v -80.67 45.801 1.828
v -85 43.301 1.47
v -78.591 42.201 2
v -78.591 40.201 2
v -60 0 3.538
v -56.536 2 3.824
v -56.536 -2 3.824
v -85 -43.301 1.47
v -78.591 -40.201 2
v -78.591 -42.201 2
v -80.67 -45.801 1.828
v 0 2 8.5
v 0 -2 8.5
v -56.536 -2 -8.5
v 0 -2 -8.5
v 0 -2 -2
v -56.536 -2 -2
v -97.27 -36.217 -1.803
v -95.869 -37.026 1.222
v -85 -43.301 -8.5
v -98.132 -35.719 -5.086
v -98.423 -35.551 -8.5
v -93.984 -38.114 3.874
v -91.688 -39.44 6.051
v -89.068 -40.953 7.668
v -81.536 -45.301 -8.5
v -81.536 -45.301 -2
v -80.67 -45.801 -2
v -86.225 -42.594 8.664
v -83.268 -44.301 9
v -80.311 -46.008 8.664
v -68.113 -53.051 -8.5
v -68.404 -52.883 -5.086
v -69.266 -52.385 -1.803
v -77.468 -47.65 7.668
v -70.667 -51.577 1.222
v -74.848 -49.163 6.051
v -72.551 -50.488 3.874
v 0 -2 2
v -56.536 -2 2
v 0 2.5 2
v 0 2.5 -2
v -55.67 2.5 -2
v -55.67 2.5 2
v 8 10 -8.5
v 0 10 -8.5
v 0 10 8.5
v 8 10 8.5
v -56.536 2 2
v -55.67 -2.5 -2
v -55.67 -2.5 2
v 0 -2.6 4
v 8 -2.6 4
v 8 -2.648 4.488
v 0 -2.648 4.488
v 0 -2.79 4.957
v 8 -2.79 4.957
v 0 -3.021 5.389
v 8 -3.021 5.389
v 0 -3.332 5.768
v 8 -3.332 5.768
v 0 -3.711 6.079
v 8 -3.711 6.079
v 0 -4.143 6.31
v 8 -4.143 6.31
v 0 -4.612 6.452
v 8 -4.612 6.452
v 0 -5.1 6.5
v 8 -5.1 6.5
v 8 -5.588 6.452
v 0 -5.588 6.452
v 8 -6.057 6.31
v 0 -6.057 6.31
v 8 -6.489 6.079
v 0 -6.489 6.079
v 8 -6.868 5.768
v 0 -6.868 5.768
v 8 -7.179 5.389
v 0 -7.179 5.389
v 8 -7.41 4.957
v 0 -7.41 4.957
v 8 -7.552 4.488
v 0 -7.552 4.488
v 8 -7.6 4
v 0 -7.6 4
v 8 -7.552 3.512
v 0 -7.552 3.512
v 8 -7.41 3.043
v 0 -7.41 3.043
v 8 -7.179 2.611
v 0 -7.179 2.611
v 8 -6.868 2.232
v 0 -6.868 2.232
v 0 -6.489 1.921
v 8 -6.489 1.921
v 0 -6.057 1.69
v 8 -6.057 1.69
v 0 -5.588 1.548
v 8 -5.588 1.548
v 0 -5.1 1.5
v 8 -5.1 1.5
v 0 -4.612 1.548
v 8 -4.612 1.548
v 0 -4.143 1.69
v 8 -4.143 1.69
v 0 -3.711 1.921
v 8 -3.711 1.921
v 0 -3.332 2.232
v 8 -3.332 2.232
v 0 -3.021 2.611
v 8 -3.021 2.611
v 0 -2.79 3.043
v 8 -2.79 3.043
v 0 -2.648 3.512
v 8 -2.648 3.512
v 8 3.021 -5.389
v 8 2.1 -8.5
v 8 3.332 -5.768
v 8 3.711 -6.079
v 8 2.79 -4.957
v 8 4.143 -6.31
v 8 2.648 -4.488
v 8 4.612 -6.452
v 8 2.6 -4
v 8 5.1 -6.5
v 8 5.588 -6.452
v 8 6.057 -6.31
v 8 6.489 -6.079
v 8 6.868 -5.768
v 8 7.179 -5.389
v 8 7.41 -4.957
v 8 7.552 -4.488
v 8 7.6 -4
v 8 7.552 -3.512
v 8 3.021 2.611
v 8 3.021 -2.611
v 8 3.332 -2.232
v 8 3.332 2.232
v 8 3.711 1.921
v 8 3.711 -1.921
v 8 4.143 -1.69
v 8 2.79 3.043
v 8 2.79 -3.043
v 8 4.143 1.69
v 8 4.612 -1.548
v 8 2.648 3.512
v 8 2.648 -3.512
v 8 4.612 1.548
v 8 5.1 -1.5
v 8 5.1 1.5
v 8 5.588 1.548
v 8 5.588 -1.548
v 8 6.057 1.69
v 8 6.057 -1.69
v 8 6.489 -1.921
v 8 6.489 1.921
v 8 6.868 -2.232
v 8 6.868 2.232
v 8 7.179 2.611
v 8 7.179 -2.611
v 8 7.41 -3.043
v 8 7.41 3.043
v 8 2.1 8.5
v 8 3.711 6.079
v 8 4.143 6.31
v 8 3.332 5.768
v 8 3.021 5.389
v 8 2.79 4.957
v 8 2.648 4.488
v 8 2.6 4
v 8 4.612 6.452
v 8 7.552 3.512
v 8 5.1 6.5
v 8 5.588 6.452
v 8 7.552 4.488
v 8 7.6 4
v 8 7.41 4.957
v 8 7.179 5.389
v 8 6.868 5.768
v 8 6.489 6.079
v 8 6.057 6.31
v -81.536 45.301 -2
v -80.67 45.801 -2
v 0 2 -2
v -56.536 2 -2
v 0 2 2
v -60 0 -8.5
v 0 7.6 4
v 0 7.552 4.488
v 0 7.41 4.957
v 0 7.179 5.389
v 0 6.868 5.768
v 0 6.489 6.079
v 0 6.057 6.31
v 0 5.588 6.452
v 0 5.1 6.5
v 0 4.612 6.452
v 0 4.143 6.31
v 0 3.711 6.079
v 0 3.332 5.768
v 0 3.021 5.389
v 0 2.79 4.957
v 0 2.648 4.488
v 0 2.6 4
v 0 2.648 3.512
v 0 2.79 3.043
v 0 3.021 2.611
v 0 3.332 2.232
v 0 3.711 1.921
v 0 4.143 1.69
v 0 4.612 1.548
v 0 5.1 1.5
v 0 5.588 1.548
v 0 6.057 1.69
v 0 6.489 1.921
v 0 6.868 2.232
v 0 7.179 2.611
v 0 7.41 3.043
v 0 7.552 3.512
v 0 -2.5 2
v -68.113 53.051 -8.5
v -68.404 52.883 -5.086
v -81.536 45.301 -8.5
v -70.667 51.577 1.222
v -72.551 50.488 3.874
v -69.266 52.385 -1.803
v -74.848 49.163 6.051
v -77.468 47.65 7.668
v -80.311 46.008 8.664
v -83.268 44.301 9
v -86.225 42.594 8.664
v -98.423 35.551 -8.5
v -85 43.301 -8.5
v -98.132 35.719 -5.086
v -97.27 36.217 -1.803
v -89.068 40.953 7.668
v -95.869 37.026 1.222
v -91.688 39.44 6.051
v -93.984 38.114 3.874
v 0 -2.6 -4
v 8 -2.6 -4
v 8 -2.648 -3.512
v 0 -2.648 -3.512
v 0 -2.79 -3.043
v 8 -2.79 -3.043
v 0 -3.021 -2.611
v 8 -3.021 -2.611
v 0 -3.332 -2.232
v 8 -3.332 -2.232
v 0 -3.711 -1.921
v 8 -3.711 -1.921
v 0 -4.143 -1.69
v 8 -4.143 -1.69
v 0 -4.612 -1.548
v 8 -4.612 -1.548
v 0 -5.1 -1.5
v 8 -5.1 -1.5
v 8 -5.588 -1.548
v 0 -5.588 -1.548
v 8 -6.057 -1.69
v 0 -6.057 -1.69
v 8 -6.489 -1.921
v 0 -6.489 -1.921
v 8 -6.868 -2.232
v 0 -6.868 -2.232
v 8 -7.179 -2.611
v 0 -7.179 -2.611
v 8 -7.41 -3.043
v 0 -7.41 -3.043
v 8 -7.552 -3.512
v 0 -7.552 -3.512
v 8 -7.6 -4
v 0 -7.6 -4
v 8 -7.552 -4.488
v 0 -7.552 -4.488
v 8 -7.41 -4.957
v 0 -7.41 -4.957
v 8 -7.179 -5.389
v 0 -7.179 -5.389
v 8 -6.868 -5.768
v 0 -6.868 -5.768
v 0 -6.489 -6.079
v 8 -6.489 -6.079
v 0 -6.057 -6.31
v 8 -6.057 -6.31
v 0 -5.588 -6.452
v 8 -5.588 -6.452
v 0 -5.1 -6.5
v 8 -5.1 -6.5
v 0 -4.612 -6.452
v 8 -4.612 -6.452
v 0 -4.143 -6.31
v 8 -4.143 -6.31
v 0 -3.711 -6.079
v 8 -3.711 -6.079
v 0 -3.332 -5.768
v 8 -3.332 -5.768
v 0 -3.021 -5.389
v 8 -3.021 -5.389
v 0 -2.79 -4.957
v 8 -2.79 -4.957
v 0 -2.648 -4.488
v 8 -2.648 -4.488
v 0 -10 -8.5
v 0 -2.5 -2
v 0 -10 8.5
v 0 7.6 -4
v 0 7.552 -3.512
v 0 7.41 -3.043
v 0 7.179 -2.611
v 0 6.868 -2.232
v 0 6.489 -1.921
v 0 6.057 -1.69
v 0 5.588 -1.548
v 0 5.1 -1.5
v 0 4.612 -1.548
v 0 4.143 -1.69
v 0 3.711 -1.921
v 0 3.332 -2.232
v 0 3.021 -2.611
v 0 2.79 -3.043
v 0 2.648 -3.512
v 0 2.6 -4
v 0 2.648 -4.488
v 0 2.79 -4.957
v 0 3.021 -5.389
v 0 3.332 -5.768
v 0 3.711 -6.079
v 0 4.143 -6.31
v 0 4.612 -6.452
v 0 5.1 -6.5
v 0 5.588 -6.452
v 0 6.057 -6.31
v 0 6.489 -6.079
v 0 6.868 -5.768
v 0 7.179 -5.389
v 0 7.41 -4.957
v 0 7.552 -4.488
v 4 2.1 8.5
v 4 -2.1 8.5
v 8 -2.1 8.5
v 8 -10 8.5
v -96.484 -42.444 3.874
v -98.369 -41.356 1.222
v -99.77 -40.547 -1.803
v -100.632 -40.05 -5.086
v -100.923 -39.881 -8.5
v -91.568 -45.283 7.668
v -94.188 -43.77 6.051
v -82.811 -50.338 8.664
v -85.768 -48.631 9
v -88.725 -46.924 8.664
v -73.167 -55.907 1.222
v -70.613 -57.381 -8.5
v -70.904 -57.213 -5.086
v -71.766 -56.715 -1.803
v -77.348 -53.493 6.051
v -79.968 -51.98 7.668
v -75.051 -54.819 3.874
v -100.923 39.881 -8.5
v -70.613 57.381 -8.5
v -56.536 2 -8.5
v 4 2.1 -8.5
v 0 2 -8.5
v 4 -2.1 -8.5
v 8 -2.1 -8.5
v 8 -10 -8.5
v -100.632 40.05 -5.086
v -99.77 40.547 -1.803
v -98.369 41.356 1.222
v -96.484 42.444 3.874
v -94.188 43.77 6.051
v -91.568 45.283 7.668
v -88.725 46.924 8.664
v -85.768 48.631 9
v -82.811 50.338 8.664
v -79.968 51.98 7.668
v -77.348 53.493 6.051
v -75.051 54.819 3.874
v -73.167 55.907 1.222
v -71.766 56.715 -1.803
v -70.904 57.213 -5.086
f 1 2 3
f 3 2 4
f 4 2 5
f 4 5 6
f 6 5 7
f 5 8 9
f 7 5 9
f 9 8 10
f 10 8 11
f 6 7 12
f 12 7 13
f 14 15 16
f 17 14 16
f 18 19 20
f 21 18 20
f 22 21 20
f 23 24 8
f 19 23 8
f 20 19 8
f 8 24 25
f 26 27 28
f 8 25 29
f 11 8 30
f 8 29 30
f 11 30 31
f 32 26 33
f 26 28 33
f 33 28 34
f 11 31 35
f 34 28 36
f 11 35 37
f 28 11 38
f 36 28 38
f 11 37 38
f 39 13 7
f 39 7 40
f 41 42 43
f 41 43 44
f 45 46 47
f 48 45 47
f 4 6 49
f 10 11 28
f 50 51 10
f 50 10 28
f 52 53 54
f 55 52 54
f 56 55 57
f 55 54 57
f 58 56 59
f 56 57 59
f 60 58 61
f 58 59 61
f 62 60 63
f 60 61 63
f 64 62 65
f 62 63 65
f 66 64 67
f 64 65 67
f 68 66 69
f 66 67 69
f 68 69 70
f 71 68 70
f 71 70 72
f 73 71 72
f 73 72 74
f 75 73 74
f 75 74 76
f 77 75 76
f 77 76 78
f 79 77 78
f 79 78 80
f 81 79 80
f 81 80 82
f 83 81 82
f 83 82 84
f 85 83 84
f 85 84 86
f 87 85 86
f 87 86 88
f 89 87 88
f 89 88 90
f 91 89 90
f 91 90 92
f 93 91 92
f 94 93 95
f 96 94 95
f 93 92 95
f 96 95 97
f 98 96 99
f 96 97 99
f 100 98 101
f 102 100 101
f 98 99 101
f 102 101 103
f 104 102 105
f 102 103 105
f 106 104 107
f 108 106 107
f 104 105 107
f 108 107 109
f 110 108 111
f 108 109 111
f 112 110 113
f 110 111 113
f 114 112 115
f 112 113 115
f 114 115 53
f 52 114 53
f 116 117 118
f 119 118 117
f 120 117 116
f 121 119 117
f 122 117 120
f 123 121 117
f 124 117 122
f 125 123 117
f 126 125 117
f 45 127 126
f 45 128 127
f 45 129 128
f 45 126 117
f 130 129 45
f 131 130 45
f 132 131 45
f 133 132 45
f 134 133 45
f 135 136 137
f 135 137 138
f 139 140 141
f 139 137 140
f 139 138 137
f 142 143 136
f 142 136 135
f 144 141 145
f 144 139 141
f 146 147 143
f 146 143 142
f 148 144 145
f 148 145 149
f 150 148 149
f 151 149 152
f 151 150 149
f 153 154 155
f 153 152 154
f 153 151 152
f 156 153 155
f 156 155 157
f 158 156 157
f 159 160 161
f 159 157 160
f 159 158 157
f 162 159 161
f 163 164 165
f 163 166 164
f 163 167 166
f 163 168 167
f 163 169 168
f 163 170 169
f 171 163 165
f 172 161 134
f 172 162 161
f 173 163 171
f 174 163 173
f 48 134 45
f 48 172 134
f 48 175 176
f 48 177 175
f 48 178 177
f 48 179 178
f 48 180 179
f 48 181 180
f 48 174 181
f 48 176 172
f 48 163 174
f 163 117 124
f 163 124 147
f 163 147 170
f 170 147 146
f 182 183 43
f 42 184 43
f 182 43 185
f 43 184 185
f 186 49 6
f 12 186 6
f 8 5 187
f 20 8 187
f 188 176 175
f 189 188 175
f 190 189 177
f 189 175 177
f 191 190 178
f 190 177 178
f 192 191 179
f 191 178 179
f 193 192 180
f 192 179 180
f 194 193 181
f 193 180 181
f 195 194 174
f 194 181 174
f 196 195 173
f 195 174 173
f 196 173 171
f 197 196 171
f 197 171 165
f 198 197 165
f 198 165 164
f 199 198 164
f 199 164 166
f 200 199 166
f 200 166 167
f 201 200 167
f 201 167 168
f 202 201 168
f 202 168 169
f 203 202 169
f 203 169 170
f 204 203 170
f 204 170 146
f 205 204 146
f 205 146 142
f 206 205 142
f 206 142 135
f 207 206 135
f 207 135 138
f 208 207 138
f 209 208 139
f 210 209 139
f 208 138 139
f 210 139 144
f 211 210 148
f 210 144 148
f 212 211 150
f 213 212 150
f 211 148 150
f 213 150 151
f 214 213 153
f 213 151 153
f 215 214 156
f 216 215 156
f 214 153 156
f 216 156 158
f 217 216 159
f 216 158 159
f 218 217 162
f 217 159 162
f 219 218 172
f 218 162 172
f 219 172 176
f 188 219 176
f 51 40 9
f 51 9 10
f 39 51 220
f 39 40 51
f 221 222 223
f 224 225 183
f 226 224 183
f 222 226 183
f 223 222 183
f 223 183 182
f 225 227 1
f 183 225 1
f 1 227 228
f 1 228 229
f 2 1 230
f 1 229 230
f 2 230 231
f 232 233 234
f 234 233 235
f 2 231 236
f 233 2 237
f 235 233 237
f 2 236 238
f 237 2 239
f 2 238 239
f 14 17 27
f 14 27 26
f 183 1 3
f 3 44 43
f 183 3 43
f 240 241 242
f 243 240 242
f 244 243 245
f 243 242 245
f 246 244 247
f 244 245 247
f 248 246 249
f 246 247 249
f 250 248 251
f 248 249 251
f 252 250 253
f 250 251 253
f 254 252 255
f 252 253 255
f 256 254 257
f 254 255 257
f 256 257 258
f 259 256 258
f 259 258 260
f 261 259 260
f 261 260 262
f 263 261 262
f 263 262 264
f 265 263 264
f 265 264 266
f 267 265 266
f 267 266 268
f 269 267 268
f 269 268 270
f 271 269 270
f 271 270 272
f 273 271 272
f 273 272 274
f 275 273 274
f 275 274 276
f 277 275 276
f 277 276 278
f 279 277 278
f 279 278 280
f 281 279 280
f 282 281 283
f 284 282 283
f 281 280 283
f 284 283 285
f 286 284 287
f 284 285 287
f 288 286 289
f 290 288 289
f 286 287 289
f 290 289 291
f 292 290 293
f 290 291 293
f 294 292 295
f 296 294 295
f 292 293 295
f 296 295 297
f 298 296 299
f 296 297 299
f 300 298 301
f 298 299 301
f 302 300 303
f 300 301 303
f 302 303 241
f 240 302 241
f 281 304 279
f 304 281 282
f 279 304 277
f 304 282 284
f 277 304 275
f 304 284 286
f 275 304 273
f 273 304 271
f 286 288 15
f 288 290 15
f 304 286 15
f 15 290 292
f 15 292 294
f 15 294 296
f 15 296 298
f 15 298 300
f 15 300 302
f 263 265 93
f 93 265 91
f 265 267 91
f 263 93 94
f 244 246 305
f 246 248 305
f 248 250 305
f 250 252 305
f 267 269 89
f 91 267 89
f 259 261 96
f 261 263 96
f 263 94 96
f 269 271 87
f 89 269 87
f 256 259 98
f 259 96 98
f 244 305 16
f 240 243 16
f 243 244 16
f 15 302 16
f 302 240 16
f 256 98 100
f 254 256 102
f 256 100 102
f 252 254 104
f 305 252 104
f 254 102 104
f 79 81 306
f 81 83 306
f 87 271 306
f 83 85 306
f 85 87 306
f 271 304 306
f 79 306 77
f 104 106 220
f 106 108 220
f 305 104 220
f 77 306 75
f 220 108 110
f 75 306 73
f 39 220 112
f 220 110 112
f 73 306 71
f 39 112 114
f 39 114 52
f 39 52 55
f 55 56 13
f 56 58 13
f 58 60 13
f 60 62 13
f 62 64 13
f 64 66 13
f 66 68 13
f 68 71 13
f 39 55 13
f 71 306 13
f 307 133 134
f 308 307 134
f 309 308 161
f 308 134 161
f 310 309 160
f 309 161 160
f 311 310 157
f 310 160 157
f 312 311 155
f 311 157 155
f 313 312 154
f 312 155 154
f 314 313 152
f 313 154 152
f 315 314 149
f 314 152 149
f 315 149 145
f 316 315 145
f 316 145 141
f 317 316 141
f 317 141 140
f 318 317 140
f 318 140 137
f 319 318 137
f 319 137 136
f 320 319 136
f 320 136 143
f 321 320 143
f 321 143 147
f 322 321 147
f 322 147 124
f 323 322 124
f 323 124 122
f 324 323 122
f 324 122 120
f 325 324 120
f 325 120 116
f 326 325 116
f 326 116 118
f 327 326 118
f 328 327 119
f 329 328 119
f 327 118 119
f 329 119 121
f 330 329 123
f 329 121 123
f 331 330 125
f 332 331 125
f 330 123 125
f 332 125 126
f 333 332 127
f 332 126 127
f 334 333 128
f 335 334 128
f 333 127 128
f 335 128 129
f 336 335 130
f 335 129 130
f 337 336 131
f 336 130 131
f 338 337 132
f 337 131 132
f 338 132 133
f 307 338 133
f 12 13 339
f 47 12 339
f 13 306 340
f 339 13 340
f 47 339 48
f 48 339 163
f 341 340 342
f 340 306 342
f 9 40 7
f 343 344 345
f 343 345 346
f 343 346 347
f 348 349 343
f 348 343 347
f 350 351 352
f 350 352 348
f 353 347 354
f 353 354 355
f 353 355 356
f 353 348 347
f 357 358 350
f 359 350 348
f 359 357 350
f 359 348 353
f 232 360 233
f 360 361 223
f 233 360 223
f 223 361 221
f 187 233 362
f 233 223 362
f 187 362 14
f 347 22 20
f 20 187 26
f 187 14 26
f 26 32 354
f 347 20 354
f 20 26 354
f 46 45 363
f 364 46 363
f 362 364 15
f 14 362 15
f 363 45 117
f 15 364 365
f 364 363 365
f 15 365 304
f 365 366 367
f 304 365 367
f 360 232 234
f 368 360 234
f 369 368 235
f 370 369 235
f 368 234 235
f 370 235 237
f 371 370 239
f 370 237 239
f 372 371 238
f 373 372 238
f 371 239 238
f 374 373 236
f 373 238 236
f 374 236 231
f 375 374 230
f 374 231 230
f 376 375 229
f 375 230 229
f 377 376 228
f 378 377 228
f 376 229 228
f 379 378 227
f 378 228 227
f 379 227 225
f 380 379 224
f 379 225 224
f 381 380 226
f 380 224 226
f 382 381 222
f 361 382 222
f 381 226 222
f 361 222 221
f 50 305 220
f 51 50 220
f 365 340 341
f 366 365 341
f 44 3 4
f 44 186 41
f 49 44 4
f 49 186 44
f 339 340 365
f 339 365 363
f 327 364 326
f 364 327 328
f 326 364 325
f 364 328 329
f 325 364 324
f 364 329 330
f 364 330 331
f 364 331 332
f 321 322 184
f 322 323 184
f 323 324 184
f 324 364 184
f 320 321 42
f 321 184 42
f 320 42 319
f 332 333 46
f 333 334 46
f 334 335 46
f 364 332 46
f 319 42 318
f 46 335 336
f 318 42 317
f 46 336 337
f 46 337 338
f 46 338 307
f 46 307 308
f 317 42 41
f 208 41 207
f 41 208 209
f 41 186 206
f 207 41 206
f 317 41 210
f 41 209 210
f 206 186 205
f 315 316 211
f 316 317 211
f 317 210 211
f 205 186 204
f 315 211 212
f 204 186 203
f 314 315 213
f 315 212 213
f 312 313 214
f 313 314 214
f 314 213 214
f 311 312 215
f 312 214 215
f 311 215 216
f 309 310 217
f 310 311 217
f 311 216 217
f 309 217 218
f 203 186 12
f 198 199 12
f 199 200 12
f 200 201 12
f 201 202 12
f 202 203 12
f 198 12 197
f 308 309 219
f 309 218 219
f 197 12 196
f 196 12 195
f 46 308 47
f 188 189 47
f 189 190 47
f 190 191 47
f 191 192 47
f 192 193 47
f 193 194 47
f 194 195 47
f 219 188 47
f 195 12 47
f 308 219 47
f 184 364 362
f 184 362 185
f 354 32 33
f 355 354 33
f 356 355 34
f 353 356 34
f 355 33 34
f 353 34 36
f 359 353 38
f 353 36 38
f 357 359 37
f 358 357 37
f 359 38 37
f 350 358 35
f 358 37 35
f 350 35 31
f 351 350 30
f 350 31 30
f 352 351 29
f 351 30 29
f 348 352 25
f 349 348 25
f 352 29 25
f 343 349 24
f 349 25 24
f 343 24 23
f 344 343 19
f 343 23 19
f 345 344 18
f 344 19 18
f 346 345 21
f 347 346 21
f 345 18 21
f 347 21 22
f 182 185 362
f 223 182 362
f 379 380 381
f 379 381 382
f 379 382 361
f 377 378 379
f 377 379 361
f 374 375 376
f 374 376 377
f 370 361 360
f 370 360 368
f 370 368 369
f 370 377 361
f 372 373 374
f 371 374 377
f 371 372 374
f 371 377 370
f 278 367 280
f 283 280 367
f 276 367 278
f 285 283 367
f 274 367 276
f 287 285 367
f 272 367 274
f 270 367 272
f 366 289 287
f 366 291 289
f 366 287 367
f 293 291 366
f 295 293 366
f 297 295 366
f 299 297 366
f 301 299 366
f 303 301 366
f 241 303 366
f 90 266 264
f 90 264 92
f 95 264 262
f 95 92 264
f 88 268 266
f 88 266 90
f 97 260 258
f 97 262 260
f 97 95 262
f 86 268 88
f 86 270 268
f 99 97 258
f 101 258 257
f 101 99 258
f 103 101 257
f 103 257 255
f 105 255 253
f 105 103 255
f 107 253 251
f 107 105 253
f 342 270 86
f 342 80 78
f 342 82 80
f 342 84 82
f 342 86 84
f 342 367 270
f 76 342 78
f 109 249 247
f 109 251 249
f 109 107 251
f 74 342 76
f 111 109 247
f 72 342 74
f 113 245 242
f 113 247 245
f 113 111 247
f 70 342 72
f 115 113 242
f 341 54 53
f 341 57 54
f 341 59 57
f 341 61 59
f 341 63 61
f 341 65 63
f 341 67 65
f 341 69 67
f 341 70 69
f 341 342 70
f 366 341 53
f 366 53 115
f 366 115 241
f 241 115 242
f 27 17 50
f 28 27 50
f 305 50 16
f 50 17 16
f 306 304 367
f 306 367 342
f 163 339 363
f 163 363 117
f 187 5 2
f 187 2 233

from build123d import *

# Parameters (mm, degrees)
F0_W      = 20
F0_H      = 17
F1_DEPTH  = 8
F2_W      = 4
F2_H      = 4.2
F3_DEPTH  = 17.001
F4_R      = 2.5
F5_DEPTH  = 8.001
F6_W      = 4
F6_H      = 6.5
F6_W_2    = 0.5
F6_H_2    = 4
F7_DEPTH  = 60
F9_DEPTH  = 17.001
F10_DEPTH = 50
F11_DEPTH = 50
F13_DEPTH = 47.8022701892
F14_DEPTH = 43.8022701892
F15_R     = 17.5
F16_DEPTH = 5
F17_R     = 17.5
F18_DEPTH = 5
F20_DEPTH = 108.9243937587


# Not quite as in the source:
# - a feature names something its author has since deleted; it is built from what else it names


with BuildPart() as f1:
    # F0 (on Right) → F1 (new body)
    with BuildSketch(Plane.YZ):
        Rectangle(F0_W, F0_H)
    extrude(amount=F1_DEPTH)

    # F2 (on face) → F3 (cut, through all)
    with BuildSketch(Plane.XY.offset(8.5)):
        with Locations((6, 0)):
            Rectangle(F2_W, F2_H)
    extrude(amount=-F3_DEPTH, mode=Mode.SUBTRACT)

    # F4 (on face) → F5 (cut, through all)
    with BuildSketch(Plane.YZ.offset(8)):
        with Locations((-5.1, 4)):
            Circle(F4_R)
        with Locations((5.1, 4)):
            Circle(F4_R)
        with Locations((-5.1, -4)):
            Circle(F4_R)
        with Locations((5.1, -4)):
            Circle(F4_R)
    extrude(amount=-F5_DEPTH, mode=Mode.SUBTRACT)

    # F6 (on Right) → F7 (join)
    with BuildSketch(Plane.YZ):
        with Locations((0, 5.25)):
            Rectangle(F6_W, F6_H)
        with Locations((2.25, 0)):
            Rectangle(F6_W_2, F6_H_2)
        Rectangle(F6_W, F6_H_2)
        with Locations((-2.25, 0)):
            Rectangle(F6_W_2, F6_H_2)
        with Locations((0, -5.25)):
            Rectangle(F6_W, F6_H)
    extrude(amount=-F7_DEPTH)

    # F8 (on face) → F9 (cut, through all)
    with BuildSketch(Plane.XY.offset(8.5)):
        Polygon((-60, -2.5), (-55.6698729811, -2.5), (-60, 0), align=None)
        Polygon((-60, 2.5), (-60, 0), (-55.6698729811, 2.5), align=None)
    extrude(amount=-F9_DEPTH, mode=Mode.SUBTRACT)

    # F10 (add): a face of the model
    f10_faces = [f1.faces().sort_by_distance(p)[0] for p in [
        (-58.1476678863, -1.0694444444, 0),
    ]]
    extrude(f10_faces, amount=F10_DEPTH)

    # F11 (add): a face of the model
    f11_faces = [f1.faces().sort_by_distance(p)[0] for p in [
        (-58.1476678863, 1.0694444444, 0),
    ]]
    extrude(f11_faces, amount=F11_DEPTH)

    # F12 (on face) → F13 (cut, through all)
    with BuildSketch(Plane.XZ.offset(2)):
        Polygon((0, 8.5), (-90.0749489665, 12.646025978), (-90.0749489665, 1.0502453661), align=None)
    extrude(amount=-F13_DEPTH, mode=Mode.SUBTRACT)

    # F12 (on face) → F14 (cut, through all)
    with BuildSketch(Plane.XZ.offset(2)):
        Polygon((0, 8.5), (-90.0749489665, 12.646025978), (-90.0749489665, 1.0502453661), align=None)
    extrude(amount=F14_DEPTH, mode=Mode.SUBTRACT)

    # F15 (on face) → F16 (join)
    with BuildSketch(Plane(origin=(-40, -69.2820323028, 0), x_dir=(0.8660254038, -0.5, 0), z_dir=(-0.5, -0.8660254038, 0))):
        with Locations((-49.9615242271, -8.5)):
            Circle(F15_R)
    extrude(amount=F16_DEPTH)

    # F17 (on face) → F18 (join)
    with BuildSketch(Plane(origin=(-40, 69.2820323028, 0), x_dir=(-0.8660254038, -0.5, 0), z_dir=(-0.5, 0.8660254038, 0))):
        with Locations((49.9615242271, -8.5)):
            Circle(F17_R)
    extrude(amount=F18_DEPTH)

    # F19 (on face) → F20 (cut, through all)
    with BuildSketch(Plane.YZ.offset(8)):
        Polygon((63.882611692, -8.5), (0, -8.5), (-60.1151846349, -8.5), (-60.0160695612, -29.4797774404), (63.882611692, -28.5877082497), align=None)
    extrude(amount=-F20_DEPTH, mode=Mode.SUBTRACT)


solid = f1.part
